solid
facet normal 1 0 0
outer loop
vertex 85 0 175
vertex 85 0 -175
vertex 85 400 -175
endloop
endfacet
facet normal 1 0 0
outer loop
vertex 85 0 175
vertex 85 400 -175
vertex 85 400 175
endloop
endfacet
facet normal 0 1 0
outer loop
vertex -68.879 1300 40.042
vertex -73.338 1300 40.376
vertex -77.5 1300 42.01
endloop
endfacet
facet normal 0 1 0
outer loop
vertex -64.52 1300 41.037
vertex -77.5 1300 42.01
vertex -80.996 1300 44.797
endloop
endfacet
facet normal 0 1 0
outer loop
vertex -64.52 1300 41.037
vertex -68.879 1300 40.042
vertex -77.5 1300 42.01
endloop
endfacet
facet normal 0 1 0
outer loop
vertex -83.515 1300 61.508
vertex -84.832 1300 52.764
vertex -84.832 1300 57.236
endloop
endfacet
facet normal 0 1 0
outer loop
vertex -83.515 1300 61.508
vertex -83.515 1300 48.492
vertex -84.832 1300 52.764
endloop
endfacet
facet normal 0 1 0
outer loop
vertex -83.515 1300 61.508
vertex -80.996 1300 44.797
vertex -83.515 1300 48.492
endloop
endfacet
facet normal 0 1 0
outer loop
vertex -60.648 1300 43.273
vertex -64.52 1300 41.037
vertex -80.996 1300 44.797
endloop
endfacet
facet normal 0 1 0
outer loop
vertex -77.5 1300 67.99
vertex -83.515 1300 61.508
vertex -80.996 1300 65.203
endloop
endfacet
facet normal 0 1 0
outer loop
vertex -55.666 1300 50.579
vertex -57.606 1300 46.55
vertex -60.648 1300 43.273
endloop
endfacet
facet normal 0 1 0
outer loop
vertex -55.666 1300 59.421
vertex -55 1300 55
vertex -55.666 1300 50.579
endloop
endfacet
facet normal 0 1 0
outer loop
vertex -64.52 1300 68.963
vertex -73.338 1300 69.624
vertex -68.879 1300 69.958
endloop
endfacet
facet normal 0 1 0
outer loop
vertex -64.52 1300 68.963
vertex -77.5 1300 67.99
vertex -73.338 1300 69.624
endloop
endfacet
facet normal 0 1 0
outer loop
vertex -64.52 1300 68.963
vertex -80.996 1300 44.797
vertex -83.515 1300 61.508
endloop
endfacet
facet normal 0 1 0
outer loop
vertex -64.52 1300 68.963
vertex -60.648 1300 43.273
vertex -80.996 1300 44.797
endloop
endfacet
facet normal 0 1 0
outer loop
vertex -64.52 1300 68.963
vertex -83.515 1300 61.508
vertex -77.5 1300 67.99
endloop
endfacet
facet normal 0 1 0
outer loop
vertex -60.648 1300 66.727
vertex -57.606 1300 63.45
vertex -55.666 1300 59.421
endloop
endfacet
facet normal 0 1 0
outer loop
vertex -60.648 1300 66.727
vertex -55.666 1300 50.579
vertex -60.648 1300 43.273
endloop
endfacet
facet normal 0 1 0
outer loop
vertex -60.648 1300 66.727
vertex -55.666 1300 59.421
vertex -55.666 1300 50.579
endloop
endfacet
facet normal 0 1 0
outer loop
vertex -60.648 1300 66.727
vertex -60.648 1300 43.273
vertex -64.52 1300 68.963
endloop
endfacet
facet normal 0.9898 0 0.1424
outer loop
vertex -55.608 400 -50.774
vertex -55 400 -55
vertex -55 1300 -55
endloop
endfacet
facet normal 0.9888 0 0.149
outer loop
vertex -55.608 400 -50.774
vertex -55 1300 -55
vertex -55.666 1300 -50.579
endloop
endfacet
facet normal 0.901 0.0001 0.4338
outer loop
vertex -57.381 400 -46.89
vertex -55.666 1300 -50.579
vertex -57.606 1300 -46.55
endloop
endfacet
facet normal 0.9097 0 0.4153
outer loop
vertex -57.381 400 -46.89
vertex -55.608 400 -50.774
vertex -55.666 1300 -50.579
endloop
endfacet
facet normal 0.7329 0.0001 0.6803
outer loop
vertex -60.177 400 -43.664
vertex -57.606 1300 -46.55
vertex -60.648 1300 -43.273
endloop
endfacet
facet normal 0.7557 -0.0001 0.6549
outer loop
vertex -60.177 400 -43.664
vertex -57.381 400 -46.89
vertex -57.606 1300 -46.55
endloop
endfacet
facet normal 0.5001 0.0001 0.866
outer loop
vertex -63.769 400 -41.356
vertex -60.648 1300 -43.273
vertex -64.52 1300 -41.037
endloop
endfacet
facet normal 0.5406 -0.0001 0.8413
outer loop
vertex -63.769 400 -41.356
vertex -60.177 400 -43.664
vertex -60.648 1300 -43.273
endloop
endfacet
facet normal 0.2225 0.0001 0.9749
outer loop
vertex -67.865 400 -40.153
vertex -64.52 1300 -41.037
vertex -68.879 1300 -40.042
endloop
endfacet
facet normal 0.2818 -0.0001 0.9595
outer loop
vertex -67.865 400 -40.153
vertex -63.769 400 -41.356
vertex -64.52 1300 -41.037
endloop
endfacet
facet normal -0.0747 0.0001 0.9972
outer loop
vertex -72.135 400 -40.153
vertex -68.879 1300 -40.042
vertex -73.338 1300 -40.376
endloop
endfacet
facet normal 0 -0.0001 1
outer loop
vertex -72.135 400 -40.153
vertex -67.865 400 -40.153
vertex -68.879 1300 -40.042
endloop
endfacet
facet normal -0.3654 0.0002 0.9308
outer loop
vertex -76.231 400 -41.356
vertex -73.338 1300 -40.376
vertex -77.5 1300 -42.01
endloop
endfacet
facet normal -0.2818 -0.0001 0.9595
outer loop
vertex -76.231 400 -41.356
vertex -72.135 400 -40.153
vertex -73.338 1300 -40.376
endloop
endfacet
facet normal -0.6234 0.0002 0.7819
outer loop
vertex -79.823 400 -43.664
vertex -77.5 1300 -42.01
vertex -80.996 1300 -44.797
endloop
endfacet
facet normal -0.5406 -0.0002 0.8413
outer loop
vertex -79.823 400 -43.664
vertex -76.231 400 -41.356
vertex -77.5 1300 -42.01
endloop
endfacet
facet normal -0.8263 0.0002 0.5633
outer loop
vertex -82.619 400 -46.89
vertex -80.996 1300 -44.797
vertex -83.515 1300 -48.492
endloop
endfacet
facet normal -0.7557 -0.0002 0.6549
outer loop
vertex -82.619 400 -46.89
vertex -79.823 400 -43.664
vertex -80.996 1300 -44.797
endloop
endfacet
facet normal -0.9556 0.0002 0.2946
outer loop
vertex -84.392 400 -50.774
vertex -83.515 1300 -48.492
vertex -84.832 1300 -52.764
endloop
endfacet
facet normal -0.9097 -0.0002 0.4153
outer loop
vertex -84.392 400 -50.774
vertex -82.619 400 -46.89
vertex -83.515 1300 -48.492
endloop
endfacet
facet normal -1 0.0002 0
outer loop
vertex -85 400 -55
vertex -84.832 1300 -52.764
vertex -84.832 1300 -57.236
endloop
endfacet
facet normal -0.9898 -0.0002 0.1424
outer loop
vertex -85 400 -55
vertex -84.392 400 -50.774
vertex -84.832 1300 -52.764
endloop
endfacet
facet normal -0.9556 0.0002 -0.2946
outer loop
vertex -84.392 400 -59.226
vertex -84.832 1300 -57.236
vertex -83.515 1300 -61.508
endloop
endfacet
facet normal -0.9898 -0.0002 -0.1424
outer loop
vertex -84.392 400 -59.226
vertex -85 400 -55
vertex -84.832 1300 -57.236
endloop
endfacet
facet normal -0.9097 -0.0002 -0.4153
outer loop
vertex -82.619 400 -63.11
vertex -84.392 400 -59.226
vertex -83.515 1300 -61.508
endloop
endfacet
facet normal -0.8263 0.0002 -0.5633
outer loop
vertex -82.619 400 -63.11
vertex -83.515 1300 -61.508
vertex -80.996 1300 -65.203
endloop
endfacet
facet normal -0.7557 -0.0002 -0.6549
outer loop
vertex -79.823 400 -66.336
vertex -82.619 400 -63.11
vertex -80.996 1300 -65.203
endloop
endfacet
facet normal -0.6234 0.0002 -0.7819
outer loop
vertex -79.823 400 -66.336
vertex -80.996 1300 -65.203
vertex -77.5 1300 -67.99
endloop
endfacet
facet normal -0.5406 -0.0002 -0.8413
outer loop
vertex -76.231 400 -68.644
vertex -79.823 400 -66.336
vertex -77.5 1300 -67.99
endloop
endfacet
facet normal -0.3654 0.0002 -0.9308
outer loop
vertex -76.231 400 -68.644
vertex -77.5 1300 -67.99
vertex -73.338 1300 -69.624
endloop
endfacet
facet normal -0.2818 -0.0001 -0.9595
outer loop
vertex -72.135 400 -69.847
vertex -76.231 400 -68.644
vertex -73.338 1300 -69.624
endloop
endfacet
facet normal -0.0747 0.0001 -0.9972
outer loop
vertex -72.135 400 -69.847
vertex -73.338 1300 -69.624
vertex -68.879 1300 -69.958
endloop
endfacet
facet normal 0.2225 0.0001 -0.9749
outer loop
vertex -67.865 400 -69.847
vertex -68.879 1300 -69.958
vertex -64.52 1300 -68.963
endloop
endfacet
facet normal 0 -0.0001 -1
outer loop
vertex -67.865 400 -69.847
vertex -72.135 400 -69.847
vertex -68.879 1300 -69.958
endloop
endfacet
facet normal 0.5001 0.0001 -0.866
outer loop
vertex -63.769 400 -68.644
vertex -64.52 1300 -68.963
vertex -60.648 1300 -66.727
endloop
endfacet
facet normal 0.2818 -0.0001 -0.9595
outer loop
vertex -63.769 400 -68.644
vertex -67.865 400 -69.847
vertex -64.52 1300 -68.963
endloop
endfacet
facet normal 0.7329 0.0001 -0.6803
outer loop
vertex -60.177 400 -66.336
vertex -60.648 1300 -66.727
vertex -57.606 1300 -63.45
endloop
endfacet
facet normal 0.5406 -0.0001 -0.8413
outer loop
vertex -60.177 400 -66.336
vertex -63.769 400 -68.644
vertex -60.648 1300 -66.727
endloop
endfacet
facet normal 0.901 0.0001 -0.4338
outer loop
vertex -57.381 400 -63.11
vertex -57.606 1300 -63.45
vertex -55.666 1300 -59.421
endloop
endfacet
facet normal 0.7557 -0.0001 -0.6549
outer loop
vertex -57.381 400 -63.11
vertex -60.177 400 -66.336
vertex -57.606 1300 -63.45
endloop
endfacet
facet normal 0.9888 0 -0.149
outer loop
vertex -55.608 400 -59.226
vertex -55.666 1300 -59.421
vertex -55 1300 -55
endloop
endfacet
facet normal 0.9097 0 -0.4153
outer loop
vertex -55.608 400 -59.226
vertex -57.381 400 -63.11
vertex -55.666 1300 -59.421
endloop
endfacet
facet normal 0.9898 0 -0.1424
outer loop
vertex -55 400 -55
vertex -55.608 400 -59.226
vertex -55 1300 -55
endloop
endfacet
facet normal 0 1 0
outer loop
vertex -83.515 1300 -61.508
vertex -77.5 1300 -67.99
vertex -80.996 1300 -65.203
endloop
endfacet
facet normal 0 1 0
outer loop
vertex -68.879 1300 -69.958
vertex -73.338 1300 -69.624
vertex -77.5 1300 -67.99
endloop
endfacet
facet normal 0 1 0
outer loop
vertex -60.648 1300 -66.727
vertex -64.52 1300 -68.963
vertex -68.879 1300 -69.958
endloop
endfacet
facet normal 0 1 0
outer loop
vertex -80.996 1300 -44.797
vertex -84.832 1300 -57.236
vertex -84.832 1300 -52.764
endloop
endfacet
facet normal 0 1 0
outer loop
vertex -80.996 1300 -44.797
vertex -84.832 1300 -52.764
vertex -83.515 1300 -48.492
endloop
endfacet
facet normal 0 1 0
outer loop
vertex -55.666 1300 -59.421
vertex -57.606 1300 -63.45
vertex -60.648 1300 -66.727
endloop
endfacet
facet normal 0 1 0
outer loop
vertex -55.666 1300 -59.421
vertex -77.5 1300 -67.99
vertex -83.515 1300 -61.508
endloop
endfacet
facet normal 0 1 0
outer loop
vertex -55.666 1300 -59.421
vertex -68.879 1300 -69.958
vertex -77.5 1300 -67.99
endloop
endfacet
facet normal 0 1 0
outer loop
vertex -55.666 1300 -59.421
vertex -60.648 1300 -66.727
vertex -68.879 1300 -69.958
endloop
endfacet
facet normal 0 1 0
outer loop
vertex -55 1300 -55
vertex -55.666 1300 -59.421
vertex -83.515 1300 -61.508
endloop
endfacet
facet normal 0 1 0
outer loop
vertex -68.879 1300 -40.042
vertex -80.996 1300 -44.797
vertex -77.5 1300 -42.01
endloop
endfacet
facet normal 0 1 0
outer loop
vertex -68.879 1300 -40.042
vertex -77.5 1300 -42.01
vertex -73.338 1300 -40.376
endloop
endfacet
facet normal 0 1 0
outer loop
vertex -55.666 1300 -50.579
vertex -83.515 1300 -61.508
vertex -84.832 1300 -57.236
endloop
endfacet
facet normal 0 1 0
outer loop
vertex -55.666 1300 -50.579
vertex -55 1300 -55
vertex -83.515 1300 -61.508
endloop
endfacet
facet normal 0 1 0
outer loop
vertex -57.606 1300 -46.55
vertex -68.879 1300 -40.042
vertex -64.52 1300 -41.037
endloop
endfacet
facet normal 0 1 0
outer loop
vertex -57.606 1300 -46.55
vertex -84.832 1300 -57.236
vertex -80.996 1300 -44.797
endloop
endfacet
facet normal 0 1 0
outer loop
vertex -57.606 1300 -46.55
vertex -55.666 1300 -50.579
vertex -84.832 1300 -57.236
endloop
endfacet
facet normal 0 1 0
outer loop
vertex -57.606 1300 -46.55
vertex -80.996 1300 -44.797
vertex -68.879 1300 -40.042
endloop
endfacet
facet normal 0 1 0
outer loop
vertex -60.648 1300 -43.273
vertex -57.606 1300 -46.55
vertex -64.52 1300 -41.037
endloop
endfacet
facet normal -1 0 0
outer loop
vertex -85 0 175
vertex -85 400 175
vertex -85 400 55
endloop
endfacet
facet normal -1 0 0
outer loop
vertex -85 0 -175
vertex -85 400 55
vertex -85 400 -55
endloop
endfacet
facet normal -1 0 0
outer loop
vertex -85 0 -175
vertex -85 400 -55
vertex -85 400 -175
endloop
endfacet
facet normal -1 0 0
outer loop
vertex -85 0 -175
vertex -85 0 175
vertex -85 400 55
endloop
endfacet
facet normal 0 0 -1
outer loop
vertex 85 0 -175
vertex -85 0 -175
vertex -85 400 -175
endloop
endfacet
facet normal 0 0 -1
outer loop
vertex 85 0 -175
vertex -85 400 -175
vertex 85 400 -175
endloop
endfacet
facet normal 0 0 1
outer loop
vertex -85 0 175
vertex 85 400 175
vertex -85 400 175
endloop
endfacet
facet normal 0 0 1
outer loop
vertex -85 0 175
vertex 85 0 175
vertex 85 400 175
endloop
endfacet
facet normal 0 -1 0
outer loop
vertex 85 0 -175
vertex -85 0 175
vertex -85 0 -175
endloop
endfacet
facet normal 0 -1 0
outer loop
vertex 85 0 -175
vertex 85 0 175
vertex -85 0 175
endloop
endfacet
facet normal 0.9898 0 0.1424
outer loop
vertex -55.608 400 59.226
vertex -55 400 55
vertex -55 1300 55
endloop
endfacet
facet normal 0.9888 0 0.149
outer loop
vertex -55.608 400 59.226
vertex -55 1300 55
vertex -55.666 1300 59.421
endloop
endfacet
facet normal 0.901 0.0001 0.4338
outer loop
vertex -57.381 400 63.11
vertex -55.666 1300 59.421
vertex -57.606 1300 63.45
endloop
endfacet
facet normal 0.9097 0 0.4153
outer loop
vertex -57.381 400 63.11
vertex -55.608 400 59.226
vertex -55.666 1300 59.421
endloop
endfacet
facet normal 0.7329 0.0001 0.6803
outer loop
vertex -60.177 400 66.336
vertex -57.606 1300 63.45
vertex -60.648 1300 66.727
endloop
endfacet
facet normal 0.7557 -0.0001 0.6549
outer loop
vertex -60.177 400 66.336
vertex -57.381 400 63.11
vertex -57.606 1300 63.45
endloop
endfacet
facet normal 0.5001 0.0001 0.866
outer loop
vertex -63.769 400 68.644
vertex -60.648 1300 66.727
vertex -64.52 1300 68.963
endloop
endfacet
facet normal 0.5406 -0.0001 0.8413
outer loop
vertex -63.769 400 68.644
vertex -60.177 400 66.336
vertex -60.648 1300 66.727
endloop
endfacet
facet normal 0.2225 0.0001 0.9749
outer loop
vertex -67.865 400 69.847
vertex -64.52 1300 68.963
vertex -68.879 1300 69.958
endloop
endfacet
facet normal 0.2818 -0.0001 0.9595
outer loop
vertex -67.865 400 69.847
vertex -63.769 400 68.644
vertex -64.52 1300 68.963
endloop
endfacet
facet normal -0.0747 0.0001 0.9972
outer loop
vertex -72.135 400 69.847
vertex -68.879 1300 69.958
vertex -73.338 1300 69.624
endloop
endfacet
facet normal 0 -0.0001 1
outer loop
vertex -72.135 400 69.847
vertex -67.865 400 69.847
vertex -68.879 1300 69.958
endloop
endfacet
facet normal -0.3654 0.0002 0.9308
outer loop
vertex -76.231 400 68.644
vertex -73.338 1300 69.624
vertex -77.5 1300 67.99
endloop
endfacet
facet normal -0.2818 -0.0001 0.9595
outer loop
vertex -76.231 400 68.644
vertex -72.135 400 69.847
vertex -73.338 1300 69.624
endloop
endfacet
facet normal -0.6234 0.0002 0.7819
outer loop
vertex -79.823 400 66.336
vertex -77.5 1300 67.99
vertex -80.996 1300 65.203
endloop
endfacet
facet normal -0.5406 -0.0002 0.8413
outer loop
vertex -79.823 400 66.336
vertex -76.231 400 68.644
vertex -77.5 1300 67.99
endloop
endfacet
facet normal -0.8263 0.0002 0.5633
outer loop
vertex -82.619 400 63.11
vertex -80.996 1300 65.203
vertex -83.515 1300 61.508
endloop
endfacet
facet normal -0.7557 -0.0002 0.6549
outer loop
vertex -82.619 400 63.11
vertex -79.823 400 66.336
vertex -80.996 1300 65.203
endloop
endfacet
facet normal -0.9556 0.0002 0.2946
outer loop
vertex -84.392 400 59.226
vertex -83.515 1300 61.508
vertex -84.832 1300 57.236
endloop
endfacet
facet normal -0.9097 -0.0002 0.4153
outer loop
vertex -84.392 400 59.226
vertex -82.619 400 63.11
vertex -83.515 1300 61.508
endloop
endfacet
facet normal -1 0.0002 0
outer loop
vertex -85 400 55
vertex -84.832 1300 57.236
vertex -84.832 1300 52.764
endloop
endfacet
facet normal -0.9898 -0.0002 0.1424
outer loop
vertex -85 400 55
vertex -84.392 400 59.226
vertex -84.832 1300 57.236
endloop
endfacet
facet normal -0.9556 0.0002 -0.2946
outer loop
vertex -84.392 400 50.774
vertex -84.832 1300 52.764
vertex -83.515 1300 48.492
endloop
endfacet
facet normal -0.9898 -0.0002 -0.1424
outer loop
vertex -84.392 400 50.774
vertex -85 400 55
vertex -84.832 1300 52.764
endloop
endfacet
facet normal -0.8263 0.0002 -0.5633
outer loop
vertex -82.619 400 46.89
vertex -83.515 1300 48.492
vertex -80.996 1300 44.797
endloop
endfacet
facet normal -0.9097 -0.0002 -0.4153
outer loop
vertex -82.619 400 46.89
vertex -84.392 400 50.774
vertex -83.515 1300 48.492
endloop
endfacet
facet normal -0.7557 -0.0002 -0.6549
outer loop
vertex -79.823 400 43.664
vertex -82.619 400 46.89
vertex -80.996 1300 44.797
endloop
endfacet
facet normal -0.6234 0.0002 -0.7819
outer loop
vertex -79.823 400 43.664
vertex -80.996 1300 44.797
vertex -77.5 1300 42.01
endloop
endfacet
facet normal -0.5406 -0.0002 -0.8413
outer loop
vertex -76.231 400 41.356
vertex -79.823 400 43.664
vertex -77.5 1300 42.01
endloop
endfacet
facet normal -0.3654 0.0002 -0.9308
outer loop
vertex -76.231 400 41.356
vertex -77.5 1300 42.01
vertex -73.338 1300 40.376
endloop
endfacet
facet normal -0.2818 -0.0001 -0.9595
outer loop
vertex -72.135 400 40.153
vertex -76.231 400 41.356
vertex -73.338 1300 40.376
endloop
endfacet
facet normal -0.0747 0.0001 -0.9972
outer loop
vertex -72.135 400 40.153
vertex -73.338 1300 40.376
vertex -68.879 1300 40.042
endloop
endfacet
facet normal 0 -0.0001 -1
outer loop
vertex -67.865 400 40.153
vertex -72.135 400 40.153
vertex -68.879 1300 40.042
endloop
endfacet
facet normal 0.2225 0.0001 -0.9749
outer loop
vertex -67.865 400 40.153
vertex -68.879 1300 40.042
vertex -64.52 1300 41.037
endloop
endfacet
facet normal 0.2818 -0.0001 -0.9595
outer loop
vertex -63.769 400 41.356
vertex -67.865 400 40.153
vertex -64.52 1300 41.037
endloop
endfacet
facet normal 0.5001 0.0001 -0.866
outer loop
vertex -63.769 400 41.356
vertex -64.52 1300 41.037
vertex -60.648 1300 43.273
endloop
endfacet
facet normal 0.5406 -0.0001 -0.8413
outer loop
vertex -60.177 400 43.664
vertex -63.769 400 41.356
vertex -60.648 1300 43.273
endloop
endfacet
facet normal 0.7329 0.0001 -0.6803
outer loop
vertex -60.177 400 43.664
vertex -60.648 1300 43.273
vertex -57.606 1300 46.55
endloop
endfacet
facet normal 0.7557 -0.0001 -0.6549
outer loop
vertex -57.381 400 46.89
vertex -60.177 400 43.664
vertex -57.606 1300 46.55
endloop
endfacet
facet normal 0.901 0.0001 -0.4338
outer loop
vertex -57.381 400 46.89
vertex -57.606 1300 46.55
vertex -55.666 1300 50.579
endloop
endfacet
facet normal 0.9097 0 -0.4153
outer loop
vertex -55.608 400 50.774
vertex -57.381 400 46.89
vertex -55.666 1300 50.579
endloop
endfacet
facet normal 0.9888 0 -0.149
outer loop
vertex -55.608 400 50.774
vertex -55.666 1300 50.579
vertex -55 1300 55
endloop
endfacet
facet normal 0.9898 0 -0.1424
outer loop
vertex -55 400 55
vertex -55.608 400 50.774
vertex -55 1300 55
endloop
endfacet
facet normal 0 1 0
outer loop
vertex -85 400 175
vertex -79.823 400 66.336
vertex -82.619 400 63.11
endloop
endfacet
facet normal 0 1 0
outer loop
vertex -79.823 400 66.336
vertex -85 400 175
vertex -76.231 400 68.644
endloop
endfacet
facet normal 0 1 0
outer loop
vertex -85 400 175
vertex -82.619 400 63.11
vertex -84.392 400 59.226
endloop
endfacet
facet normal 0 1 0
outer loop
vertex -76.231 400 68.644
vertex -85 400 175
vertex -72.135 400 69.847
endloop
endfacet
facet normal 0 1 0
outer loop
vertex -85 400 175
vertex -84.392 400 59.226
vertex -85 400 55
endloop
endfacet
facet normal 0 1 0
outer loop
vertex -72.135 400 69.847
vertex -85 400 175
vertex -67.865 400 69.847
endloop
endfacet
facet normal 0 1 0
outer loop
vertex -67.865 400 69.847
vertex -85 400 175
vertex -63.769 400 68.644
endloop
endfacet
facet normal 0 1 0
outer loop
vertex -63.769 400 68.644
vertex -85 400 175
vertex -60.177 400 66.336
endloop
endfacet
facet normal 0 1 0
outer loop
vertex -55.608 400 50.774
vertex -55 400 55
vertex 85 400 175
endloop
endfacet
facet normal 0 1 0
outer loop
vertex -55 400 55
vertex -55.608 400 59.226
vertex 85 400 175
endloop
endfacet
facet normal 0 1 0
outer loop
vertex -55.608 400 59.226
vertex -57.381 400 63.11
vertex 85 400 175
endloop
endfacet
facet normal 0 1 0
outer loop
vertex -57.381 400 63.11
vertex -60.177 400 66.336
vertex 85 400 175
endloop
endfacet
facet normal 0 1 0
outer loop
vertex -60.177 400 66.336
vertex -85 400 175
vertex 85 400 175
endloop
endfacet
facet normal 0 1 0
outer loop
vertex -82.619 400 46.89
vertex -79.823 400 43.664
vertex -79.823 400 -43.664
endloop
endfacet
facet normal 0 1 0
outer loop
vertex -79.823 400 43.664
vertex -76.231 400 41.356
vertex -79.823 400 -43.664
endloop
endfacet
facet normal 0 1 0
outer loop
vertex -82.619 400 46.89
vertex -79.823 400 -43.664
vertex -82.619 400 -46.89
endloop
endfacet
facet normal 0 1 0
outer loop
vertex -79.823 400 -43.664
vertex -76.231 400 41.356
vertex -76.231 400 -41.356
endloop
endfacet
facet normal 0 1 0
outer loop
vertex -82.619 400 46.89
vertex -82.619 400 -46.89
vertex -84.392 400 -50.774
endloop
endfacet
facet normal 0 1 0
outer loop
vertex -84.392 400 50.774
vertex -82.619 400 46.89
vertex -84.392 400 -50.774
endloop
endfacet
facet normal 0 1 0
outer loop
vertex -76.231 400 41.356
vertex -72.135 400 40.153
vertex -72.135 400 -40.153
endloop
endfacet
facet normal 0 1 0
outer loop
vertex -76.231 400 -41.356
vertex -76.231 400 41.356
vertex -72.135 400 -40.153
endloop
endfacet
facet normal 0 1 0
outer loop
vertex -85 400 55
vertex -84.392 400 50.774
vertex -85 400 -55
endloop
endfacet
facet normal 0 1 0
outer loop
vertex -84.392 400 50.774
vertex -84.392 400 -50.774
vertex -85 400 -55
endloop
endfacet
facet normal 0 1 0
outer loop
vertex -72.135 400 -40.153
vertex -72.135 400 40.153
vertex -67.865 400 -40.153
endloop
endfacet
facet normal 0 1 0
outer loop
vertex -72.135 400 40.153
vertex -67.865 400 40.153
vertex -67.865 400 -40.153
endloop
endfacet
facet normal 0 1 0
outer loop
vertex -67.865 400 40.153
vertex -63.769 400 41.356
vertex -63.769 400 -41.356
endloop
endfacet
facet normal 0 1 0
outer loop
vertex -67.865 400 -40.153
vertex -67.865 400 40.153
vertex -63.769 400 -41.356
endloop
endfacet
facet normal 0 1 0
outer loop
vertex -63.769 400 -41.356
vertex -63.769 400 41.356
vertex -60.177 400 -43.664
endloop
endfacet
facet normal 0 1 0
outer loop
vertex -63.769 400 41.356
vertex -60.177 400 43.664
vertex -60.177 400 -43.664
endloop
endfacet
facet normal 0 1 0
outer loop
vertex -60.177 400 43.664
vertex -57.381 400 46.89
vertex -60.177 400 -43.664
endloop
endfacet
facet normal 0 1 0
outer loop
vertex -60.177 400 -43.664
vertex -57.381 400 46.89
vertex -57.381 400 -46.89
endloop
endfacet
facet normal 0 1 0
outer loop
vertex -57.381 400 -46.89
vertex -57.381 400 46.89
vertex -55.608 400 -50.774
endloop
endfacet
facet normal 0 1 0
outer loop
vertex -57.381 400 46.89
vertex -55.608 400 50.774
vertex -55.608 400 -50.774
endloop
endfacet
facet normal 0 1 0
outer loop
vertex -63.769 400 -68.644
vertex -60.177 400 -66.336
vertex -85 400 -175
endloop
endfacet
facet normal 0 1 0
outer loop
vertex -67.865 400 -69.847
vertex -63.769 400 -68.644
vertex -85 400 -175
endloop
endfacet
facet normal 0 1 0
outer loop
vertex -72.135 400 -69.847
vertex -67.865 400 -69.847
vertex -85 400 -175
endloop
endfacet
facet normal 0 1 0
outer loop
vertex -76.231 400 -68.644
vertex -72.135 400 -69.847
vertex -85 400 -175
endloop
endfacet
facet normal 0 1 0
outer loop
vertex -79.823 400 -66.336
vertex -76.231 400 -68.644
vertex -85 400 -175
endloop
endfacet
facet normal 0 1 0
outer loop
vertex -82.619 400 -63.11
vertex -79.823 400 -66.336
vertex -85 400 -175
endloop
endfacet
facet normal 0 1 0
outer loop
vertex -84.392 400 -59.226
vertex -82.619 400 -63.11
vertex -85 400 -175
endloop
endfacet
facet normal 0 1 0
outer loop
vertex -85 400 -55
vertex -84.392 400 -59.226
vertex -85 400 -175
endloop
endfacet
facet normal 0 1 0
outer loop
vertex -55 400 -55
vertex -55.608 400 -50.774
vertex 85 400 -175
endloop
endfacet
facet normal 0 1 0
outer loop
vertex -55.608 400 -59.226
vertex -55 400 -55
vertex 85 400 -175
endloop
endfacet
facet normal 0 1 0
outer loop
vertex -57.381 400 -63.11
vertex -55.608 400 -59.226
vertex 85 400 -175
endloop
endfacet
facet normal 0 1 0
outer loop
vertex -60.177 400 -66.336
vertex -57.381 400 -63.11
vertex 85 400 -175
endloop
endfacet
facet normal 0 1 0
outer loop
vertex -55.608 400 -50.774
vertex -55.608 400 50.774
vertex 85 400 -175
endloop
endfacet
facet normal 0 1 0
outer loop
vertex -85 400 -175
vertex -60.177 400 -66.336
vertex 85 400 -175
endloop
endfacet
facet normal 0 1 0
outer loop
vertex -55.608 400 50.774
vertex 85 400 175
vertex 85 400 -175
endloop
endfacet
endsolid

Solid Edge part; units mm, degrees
sketch "Sketch1" plane through (0, 0, 0) normal (0, -1, 0) x (1, 0, 0)
  line L0 (-85, 175) -> (-85, -175)
  line L1 (-85, -175) -> (85, -175)
  line L2 (85, -175) -> (85, 175)
  line L3 (85, 175) -> (-85, 175)
extrude "Protrusion1" add sketch "Sketch1" against normal blind 400
sketch "Sketch2" plane through (0, 400, 0) normal (0, 1, 0) x (1, 0, 0)
  circle A0 centre (-70, 55) radius 15
extrude "Extrusionsausprägung_9" add sketch "Sketch2" along normal blind 900
mirror "Mirror1" about plane through (0, 0, 0) normal (0, 0, 1) of "Extrusionsausprägung_9"
